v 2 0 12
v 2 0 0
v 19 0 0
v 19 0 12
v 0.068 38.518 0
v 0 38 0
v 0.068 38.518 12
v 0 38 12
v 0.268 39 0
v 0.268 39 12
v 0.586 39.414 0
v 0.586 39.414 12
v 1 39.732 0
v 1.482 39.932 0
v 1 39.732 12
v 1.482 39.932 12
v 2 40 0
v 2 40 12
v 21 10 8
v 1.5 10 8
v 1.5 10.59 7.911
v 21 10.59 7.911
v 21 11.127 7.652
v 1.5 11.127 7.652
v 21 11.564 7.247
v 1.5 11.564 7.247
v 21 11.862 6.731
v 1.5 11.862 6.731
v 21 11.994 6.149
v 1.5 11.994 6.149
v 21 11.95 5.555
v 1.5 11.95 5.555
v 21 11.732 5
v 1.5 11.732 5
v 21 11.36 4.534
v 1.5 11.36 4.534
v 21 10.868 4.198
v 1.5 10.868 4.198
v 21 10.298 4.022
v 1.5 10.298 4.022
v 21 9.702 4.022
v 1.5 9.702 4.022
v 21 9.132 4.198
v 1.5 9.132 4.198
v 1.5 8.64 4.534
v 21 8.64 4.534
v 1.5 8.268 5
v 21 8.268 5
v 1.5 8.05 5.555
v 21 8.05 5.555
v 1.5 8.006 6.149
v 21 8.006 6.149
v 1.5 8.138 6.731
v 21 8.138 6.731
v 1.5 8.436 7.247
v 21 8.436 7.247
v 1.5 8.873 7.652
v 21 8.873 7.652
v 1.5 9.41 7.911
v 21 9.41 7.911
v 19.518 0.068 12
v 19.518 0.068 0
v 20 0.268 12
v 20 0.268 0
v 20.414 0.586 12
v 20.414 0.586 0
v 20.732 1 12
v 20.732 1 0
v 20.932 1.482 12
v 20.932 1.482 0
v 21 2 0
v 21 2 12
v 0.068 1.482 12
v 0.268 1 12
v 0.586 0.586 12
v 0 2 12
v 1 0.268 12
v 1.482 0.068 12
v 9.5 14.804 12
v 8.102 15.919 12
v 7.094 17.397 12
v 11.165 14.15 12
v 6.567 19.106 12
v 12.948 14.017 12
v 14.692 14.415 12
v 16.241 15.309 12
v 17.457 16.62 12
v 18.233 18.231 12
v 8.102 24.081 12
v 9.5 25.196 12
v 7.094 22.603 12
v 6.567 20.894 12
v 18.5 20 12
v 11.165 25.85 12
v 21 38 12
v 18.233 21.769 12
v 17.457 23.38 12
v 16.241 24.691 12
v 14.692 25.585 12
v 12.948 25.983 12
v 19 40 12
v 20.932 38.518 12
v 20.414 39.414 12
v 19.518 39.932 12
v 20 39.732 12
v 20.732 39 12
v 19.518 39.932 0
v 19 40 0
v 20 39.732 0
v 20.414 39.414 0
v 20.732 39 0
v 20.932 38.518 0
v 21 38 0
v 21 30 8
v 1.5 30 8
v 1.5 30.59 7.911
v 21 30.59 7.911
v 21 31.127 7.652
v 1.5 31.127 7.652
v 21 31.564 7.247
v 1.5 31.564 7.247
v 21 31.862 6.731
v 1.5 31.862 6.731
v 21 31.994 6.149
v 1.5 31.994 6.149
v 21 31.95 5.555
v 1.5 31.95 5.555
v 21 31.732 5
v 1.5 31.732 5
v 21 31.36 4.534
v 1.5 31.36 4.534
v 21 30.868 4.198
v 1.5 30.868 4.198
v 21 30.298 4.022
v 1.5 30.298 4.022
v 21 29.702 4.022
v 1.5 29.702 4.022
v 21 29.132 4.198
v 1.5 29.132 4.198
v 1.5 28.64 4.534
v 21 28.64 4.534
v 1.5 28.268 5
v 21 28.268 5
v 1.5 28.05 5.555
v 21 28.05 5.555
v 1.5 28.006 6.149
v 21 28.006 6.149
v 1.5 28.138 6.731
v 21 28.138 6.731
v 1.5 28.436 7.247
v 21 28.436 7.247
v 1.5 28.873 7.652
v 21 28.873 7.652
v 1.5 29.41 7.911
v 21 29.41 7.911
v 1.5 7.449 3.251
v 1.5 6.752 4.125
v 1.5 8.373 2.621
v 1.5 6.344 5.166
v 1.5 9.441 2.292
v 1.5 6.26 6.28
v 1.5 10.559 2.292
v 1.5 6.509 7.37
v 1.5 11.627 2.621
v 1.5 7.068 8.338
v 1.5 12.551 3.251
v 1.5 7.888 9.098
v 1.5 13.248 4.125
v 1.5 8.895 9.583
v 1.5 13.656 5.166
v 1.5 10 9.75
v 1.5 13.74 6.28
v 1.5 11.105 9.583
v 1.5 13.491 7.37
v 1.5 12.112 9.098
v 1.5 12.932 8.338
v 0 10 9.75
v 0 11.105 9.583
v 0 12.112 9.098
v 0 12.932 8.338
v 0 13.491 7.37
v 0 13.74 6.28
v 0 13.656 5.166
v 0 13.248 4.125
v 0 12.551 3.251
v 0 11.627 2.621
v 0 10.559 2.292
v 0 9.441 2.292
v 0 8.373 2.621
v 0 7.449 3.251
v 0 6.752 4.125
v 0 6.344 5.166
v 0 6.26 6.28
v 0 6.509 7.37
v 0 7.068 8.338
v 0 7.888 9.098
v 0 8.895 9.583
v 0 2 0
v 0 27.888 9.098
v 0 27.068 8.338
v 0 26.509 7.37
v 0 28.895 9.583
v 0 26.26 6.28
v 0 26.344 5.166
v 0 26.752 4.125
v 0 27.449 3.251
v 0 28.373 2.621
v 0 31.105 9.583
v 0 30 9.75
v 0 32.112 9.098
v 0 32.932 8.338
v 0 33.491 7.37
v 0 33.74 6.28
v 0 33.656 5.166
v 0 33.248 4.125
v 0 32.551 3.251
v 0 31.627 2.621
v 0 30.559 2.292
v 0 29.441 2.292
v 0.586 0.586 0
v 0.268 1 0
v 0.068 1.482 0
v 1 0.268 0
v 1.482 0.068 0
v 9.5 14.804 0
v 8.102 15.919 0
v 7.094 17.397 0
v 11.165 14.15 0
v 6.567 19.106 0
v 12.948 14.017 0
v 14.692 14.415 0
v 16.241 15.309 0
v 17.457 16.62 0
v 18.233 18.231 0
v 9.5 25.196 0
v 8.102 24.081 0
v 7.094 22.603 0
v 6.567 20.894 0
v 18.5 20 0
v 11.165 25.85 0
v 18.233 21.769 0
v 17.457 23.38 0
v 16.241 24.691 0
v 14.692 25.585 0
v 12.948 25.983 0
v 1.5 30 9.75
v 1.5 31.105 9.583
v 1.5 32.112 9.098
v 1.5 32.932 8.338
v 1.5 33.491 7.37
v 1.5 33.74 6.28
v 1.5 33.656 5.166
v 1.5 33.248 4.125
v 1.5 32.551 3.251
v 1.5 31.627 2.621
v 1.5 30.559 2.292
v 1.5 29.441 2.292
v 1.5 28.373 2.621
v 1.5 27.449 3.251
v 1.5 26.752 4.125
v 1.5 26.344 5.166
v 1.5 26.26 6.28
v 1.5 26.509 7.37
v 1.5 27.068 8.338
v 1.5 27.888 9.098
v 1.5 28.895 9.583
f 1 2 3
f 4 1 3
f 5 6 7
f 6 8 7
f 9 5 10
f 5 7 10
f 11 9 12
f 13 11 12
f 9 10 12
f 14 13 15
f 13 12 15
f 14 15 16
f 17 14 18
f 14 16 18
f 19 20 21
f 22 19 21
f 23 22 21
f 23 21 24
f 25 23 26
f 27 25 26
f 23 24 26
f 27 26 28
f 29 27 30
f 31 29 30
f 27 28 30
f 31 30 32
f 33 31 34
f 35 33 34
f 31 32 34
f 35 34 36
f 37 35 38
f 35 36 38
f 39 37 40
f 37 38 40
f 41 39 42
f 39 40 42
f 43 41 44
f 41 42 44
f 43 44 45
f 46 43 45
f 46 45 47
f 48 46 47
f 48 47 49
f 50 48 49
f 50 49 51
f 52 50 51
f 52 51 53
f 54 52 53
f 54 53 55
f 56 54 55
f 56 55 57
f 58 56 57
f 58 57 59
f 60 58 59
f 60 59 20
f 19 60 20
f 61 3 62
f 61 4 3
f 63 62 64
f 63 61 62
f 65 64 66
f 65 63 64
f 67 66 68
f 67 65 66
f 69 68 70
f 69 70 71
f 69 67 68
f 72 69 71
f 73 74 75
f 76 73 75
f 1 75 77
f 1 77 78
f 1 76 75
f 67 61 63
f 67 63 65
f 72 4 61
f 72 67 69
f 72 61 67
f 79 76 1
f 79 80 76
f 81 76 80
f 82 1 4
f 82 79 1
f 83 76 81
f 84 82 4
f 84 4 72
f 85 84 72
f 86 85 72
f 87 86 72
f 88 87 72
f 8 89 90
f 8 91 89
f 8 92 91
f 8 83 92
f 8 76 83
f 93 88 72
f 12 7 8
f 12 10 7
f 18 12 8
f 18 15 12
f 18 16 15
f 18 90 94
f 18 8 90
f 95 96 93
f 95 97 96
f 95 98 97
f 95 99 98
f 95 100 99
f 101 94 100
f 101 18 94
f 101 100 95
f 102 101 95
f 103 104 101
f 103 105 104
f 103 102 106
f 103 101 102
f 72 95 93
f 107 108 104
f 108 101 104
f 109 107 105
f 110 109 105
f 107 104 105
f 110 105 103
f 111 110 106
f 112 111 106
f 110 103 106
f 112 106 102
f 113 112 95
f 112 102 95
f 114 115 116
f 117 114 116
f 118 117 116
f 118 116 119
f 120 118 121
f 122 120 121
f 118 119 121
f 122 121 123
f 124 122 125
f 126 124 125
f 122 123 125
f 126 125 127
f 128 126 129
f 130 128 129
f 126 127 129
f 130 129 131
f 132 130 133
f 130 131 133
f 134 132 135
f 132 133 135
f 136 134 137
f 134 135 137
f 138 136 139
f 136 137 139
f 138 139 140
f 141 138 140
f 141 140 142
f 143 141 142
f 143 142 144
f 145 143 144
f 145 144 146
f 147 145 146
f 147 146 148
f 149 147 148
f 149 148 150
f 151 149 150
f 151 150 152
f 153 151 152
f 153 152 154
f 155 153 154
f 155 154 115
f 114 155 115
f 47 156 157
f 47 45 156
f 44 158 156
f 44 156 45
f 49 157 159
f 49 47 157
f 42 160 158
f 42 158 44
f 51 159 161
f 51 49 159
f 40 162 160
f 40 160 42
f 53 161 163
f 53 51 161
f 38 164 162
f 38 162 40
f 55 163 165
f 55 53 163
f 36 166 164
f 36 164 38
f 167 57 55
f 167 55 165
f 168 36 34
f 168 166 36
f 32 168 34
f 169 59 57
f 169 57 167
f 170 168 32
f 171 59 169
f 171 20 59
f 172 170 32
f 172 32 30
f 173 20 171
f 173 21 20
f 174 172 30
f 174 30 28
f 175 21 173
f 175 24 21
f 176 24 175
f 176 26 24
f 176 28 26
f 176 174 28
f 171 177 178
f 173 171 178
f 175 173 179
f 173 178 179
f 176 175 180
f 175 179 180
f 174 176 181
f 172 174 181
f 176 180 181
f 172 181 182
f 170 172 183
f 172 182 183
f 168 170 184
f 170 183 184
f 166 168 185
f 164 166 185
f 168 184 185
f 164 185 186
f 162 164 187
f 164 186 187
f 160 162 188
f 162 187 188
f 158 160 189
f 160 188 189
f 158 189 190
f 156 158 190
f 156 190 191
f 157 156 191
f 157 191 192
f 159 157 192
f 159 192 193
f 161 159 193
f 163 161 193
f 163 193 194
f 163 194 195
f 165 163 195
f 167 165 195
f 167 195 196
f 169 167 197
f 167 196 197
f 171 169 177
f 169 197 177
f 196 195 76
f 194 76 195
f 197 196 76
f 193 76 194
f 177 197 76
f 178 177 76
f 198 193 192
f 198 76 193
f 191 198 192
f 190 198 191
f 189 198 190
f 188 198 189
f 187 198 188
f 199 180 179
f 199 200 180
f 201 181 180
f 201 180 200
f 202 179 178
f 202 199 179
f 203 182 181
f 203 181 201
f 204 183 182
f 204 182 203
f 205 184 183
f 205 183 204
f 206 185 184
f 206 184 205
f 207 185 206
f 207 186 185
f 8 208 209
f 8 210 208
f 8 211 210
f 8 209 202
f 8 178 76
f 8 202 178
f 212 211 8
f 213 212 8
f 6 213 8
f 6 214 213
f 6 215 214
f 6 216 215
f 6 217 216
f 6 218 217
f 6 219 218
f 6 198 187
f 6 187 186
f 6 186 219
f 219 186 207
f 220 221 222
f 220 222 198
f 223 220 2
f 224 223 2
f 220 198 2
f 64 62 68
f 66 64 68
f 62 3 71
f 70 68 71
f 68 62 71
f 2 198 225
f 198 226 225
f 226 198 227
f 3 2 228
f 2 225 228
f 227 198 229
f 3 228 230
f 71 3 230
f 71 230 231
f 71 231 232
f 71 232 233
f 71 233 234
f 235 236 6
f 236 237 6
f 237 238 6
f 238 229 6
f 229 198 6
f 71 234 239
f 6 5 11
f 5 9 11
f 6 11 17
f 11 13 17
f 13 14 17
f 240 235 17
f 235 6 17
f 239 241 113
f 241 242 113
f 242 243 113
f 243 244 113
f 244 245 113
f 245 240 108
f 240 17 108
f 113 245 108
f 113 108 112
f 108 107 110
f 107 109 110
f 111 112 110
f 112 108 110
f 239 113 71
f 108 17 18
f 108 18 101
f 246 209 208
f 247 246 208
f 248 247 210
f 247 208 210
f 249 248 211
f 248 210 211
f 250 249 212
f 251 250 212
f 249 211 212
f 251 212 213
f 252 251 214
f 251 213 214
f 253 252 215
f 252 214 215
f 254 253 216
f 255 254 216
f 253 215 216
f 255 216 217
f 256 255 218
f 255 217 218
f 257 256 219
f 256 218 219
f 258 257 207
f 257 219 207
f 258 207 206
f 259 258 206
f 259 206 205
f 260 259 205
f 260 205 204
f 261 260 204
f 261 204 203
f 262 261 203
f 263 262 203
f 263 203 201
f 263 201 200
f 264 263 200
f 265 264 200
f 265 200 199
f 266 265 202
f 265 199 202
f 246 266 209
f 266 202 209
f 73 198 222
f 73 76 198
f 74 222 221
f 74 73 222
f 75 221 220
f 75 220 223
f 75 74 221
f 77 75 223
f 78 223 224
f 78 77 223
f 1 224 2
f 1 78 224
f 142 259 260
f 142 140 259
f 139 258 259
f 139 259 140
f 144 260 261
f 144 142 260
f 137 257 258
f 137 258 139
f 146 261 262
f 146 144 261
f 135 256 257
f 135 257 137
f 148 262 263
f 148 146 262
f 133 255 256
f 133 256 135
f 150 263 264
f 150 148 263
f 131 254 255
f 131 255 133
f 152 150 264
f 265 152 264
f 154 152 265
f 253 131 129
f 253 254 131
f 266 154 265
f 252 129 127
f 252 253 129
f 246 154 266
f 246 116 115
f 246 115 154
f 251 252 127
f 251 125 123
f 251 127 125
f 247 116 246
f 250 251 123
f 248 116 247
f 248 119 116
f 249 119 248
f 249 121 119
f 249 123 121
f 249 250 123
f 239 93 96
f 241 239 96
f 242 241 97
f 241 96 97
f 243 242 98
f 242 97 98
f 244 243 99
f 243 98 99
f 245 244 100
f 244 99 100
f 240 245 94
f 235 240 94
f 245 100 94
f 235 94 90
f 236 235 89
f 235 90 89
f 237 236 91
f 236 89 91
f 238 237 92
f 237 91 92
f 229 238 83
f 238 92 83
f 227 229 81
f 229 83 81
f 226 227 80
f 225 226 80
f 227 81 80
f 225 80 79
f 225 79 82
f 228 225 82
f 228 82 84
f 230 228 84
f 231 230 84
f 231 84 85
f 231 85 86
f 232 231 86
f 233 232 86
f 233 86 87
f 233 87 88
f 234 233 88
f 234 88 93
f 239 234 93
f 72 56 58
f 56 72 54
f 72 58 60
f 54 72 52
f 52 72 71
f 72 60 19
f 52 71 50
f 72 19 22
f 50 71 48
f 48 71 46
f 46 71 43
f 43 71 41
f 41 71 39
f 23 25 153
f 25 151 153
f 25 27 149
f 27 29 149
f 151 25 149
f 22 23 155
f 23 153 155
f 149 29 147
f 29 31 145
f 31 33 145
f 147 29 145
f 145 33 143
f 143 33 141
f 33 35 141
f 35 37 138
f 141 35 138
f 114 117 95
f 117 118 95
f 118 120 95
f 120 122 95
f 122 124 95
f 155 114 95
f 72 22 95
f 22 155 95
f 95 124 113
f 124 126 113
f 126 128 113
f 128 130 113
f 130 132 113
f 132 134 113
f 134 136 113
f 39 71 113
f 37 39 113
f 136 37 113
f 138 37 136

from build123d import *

# Parameters (mm, degrees)
SKETCH1_W           = 21
SKETCH1_H           = 40
BOSS_EXTRUDE1_DEPTH = 12
CUT_EXTRUDE1_REACH  = 48.744
SKETCH2_R           = 6
CUT_EXTRUDE2_REACH  = 48.744
SKETCH3_R           = 2
SKETCH4_R           = 3.75
CUT_EXTRUDE3_DEPTH  = 1.5
FILLET1_R           = 2


with BuildPart() as part:
    # Sketch1 → Boss-Extrude1 (new body)
    with BuildSketch(Plane.XY):
        with Locations((10.5, 20)):
            Rectangle(SKETCH1_W, SKETCH1_H)
    extrude(amount=BOSS_EXTRUDE1_DEPTH)

    # Sketch2 → Cut-Extrude1 (cut, up to next)
    with BuildSketch(Plane.XY.offset(12), mode=Mode.PRIVATE) as cut_extrude1_sk1:
        with Locations((12.5, 20)):
            Circle(SKETCH2_R)
    cut_extrude1_tool1 = extrude(cut_extrude1_sk1.sketch, amount=-CUT_EXTRUDE1_REACH, mode=Mode.PRIVATE) & part.part
    add(cut_extrude1_tool1.solids().sort_by_distance((12.5, 20, 12))[0], mode=Mode.SUBTRACT)

    # Sketch3 → Cut-Extrude2 (cut, up to next)
    with BuildSketch(Plane.ZY, mode=Mode.PRIVATE) as cut_extrude2_sk1:
        with Locations((6, 30)):
            Circle(SKETCH3_R)
    cut_extrude2_tool1 = extrude(cut_extrude2_sk1.sketch, amount=-CUT_EXTRUDE2_REACH, mode=Mode.PRIVATE) & part.part
    # Sketch3 → Cut-Extrude2 (cut, up to next)
    with BuildSketch(Plane.ZY, mode=Mode.PRIVATE) as cut_extrude2_sk2:
        with Locations((6, 10)):
            Circle(SKETCH3_R)
    cut_extrude2_tool2 = extrude(cut_extrude2_sk2.sketch, amount=-CUT_EXTRUDE2_REACH, mode=Mode.PRIVATE) & part.part
    add(cut_extrude2_tool1.solids().sort_by_distance((0, 30, 6))[0], mode=Mode.SUBTRACT)
    add(cut_extrude2_tool2.solids().sort_by_distance((0, 10, 6))[0], mode=Mode.SUBTRACT)

    # Sketch4 → Cut-Extrude3 (cut)
    with BuildSketch(Plane.ZY):
        with Locations((6, 30)):
            Circle(SKETCH4_R)
        with Locations((6, 10)):
            Circle(SKETCH4_R)
    extrude(amount=-CUT_EXTRUDE3_DEPTH, mode=Mode.SUBTRACT)

    # Fillet1
    fillet1_edges = [part.edges().sort_by_distance(p)[0] for p in [
        (0, 40, 6),
        (21, 40, 6),
        (21, 0, 6),
        (0, 0, 6),
    ]]
    fillet(fillet1_edges, radius=FILLET1_R)


solid = part.part
